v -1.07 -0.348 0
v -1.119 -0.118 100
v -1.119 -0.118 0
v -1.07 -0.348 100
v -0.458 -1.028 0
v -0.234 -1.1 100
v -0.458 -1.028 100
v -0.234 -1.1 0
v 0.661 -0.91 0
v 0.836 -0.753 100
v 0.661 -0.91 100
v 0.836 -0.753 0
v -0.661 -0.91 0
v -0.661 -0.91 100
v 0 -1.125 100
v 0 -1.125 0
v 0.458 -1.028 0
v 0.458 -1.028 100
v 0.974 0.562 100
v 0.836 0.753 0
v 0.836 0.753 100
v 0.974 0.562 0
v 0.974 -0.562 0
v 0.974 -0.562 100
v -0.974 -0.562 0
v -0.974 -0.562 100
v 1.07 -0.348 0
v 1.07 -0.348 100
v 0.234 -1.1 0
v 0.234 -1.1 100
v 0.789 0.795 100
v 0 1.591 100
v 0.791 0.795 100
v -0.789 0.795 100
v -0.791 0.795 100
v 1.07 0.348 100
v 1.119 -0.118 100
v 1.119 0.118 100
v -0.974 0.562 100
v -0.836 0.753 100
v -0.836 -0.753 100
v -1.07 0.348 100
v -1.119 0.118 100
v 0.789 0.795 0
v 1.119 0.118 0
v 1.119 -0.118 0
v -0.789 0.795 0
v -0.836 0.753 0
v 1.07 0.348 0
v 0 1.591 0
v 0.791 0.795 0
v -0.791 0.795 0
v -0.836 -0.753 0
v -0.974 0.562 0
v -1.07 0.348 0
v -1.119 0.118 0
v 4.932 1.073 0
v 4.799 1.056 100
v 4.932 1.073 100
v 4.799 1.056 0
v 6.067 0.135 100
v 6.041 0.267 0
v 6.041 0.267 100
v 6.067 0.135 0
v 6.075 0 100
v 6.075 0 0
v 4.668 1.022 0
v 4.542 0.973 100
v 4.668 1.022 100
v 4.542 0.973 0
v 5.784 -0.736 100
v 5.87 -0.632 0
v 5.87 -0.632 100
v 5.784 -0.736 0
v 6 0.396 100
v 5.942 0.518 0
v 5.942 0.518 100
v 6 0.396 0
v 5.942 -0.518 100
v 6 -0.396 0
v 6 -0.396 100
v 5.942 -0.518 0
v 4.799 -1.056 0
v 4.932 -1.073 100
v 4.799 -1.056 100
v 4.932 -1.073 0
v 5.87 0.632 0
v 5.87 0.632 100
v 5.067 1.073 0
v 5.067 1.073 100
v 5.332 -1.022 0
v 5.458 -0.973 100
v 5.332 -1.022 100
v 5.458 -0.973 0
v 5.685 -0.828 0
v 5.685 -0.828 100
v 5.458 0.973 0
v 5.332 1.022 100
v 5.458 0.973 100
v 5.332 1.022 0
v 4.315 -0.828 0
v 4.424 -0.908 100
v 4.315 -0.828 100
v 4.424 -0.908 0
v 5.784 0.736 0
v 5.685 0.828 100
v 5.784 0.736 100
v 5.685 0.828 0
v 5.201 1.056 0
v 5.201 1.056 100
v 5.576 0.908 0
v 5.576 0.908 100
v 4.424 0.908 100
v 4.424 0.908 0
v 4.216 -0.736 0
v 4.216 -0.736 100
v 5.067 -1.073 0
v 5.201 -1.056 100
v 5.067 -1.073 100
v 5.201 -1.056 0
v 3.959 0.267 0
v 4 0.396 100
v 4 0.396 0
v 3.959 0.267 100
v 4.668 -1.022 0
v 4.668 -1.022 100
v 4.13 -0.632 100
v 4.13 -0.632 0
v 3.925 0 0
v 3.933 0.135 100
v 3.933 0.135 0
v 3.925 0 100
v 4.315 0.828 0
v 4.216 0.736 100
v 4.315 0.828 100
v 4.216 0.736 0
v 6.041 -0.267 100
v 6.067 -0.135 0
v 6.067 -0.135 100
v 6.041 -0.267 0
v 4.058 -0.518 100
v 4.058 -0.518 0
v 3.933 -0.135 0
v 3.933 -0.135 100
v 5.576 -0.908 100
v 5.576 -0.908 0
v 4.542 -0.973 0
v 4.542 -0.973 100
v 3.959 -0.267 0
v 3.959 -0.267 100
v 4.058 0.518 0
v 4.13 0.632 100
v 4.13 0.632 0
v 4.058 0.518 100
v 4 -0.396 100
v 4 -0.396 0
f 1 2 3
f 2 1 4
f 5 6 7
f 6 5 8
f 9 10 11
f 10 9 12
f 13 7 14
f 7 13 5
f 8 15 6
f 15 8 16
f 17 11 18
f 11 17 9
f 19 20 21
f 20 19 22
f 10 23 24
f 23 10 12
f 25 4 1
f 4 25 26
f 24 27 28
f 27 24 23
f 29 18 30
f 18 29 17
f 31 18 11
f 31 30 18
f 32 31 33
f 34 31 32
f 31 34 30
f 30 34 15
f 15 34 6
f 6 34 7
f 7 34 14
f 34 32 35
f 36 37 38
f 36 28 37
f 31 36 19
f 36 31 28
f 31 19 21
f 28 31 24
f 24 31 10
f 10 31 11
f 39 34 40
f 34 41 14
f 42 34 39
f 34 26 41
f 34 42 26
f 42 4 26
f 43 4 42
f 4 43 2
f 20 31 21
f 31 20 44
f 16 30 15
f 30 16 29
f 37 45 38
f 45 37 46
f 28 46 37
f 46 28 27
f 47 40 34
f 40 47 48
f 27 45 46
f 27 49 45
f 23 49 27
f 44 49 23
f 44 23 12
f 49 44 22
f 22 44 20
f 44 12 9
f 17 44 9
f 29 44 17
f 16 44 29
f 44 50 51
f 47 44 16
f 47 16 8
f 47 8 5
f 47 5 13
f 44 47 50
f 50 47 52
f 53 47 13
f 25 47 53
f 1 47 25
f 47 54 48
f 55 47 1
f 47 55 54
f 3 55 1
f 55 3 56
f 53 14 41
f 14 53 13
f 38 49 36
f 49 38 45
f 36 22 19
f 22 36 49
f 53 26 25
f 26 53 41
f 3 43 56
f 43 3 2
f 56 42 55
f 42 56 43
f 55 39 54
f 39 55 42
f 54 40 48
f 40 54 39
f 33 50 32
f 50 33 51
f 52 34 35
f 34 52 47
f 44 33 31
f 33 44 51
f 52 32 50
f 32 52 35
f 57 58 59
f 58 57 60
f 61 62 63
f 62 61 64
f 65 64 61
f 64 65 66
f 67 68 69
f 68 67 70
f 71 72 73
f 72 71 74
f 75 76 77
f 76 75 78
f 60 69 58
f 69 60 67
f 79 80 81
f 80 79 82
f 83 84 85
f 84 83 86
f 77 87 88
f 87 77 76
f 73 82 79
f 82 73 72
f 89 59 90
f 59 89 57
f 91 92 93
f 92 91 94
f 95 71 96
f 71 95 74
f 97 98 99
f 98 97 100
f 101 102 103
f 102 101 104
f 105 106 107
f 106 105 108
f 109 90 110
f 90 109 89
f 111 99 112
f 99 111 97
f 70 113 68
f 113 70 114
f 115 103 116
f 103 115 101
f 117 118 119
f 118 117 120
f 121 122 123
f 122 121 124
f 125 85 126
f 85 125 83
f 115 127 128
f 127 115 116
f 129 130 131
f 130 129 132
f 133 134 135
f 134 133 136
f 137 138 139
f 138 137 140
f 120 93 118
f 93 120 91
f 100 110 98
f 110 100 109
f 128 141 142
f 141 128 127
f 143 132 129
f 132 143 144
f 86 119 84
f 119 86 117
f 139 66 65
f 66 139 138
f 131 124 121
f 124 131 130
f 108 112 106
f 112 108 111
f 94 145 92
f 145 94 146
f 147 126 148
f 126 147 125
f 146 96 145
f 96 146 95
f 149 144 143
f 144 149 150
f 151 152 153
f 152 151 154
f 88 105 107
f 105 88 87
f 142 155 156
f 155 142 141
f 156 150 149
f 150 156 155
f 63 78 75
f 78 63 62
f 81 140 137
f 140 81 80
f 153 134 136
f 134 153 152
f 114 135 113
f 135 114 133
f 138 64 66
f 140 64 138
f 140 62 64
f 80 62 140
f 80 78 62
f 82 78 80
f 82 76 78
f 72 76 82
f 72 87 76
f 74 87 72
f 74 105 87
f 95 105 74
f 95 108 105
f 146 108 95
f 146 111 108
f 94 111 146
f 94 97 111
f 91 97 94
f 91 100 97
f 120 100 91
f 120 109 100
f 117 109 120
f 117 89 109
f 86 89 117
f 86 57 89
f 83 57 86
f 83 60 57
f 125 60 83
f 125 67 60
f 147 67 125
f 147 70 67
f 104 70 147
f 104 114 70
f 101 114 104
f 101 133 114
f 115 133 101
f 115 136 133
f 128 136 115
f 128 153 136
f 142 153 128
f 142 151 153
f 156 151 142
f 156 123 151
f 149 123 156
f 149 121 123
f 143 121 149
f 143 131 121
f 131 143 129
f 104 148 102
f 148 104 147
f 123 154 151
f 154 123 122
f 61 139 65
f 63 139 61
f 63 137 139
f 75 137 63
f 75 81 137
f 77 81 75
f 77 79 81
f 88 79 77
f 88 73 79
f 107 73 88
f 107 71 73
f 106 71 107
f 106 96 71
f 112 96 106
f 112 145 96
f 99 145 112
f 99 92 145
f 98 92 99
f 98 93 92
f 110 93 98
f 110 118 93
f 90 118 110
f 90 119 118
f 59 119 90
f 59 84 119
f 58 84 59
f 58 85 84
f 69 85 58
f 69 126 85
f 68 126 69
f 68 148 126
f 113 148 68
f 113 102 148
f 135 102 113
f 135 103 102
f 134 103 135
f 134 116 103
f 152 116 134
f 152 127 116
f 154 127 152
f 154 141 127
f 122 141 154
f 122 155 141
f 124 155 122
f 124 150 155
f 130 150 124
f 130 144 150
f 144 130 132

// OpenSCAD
function FilamentDiam(3dPrinterTolerance=.4)=1.75+3dPrinterTolerance;
function FilamentHeight()=100;
module Filament()
{
	$fn=50;
	cylinder(h=FilamentHeight(), r=FilamentDiam(.4)/2);
}

translate([5,0,0]){
Filament();
}


//teardrop shape for better accuracy when printing long tubes:

module teardrop(radius, length, angle) {
        rotate([0, angle, 0]) union() {
                linear_extrude(height = length, center = true, convexity = radius, twist = 0)
                        circle(r = radius, center = true, $fn = 30);
                linear_extrude(height = length, center = true, convexity = radius, twist = 0)
                        projection(cut = false) rotate([0, -angle, 0]) translate([0, 0, radius * sin(45) * 1.5]) cylinder(h = radius * sin(45), r1 = radius * sin(45), r2 = 0, center = true, $fn = 30);
        }
}
module FilamentTear(){
	translate([0,0,FilamentHeight()/2]){
		rotate([0,90,90]){
			teardrop(FilamentDiam(.5)/2,FilamentHeight(),90);
		}
	}
}

FilamentTear();
